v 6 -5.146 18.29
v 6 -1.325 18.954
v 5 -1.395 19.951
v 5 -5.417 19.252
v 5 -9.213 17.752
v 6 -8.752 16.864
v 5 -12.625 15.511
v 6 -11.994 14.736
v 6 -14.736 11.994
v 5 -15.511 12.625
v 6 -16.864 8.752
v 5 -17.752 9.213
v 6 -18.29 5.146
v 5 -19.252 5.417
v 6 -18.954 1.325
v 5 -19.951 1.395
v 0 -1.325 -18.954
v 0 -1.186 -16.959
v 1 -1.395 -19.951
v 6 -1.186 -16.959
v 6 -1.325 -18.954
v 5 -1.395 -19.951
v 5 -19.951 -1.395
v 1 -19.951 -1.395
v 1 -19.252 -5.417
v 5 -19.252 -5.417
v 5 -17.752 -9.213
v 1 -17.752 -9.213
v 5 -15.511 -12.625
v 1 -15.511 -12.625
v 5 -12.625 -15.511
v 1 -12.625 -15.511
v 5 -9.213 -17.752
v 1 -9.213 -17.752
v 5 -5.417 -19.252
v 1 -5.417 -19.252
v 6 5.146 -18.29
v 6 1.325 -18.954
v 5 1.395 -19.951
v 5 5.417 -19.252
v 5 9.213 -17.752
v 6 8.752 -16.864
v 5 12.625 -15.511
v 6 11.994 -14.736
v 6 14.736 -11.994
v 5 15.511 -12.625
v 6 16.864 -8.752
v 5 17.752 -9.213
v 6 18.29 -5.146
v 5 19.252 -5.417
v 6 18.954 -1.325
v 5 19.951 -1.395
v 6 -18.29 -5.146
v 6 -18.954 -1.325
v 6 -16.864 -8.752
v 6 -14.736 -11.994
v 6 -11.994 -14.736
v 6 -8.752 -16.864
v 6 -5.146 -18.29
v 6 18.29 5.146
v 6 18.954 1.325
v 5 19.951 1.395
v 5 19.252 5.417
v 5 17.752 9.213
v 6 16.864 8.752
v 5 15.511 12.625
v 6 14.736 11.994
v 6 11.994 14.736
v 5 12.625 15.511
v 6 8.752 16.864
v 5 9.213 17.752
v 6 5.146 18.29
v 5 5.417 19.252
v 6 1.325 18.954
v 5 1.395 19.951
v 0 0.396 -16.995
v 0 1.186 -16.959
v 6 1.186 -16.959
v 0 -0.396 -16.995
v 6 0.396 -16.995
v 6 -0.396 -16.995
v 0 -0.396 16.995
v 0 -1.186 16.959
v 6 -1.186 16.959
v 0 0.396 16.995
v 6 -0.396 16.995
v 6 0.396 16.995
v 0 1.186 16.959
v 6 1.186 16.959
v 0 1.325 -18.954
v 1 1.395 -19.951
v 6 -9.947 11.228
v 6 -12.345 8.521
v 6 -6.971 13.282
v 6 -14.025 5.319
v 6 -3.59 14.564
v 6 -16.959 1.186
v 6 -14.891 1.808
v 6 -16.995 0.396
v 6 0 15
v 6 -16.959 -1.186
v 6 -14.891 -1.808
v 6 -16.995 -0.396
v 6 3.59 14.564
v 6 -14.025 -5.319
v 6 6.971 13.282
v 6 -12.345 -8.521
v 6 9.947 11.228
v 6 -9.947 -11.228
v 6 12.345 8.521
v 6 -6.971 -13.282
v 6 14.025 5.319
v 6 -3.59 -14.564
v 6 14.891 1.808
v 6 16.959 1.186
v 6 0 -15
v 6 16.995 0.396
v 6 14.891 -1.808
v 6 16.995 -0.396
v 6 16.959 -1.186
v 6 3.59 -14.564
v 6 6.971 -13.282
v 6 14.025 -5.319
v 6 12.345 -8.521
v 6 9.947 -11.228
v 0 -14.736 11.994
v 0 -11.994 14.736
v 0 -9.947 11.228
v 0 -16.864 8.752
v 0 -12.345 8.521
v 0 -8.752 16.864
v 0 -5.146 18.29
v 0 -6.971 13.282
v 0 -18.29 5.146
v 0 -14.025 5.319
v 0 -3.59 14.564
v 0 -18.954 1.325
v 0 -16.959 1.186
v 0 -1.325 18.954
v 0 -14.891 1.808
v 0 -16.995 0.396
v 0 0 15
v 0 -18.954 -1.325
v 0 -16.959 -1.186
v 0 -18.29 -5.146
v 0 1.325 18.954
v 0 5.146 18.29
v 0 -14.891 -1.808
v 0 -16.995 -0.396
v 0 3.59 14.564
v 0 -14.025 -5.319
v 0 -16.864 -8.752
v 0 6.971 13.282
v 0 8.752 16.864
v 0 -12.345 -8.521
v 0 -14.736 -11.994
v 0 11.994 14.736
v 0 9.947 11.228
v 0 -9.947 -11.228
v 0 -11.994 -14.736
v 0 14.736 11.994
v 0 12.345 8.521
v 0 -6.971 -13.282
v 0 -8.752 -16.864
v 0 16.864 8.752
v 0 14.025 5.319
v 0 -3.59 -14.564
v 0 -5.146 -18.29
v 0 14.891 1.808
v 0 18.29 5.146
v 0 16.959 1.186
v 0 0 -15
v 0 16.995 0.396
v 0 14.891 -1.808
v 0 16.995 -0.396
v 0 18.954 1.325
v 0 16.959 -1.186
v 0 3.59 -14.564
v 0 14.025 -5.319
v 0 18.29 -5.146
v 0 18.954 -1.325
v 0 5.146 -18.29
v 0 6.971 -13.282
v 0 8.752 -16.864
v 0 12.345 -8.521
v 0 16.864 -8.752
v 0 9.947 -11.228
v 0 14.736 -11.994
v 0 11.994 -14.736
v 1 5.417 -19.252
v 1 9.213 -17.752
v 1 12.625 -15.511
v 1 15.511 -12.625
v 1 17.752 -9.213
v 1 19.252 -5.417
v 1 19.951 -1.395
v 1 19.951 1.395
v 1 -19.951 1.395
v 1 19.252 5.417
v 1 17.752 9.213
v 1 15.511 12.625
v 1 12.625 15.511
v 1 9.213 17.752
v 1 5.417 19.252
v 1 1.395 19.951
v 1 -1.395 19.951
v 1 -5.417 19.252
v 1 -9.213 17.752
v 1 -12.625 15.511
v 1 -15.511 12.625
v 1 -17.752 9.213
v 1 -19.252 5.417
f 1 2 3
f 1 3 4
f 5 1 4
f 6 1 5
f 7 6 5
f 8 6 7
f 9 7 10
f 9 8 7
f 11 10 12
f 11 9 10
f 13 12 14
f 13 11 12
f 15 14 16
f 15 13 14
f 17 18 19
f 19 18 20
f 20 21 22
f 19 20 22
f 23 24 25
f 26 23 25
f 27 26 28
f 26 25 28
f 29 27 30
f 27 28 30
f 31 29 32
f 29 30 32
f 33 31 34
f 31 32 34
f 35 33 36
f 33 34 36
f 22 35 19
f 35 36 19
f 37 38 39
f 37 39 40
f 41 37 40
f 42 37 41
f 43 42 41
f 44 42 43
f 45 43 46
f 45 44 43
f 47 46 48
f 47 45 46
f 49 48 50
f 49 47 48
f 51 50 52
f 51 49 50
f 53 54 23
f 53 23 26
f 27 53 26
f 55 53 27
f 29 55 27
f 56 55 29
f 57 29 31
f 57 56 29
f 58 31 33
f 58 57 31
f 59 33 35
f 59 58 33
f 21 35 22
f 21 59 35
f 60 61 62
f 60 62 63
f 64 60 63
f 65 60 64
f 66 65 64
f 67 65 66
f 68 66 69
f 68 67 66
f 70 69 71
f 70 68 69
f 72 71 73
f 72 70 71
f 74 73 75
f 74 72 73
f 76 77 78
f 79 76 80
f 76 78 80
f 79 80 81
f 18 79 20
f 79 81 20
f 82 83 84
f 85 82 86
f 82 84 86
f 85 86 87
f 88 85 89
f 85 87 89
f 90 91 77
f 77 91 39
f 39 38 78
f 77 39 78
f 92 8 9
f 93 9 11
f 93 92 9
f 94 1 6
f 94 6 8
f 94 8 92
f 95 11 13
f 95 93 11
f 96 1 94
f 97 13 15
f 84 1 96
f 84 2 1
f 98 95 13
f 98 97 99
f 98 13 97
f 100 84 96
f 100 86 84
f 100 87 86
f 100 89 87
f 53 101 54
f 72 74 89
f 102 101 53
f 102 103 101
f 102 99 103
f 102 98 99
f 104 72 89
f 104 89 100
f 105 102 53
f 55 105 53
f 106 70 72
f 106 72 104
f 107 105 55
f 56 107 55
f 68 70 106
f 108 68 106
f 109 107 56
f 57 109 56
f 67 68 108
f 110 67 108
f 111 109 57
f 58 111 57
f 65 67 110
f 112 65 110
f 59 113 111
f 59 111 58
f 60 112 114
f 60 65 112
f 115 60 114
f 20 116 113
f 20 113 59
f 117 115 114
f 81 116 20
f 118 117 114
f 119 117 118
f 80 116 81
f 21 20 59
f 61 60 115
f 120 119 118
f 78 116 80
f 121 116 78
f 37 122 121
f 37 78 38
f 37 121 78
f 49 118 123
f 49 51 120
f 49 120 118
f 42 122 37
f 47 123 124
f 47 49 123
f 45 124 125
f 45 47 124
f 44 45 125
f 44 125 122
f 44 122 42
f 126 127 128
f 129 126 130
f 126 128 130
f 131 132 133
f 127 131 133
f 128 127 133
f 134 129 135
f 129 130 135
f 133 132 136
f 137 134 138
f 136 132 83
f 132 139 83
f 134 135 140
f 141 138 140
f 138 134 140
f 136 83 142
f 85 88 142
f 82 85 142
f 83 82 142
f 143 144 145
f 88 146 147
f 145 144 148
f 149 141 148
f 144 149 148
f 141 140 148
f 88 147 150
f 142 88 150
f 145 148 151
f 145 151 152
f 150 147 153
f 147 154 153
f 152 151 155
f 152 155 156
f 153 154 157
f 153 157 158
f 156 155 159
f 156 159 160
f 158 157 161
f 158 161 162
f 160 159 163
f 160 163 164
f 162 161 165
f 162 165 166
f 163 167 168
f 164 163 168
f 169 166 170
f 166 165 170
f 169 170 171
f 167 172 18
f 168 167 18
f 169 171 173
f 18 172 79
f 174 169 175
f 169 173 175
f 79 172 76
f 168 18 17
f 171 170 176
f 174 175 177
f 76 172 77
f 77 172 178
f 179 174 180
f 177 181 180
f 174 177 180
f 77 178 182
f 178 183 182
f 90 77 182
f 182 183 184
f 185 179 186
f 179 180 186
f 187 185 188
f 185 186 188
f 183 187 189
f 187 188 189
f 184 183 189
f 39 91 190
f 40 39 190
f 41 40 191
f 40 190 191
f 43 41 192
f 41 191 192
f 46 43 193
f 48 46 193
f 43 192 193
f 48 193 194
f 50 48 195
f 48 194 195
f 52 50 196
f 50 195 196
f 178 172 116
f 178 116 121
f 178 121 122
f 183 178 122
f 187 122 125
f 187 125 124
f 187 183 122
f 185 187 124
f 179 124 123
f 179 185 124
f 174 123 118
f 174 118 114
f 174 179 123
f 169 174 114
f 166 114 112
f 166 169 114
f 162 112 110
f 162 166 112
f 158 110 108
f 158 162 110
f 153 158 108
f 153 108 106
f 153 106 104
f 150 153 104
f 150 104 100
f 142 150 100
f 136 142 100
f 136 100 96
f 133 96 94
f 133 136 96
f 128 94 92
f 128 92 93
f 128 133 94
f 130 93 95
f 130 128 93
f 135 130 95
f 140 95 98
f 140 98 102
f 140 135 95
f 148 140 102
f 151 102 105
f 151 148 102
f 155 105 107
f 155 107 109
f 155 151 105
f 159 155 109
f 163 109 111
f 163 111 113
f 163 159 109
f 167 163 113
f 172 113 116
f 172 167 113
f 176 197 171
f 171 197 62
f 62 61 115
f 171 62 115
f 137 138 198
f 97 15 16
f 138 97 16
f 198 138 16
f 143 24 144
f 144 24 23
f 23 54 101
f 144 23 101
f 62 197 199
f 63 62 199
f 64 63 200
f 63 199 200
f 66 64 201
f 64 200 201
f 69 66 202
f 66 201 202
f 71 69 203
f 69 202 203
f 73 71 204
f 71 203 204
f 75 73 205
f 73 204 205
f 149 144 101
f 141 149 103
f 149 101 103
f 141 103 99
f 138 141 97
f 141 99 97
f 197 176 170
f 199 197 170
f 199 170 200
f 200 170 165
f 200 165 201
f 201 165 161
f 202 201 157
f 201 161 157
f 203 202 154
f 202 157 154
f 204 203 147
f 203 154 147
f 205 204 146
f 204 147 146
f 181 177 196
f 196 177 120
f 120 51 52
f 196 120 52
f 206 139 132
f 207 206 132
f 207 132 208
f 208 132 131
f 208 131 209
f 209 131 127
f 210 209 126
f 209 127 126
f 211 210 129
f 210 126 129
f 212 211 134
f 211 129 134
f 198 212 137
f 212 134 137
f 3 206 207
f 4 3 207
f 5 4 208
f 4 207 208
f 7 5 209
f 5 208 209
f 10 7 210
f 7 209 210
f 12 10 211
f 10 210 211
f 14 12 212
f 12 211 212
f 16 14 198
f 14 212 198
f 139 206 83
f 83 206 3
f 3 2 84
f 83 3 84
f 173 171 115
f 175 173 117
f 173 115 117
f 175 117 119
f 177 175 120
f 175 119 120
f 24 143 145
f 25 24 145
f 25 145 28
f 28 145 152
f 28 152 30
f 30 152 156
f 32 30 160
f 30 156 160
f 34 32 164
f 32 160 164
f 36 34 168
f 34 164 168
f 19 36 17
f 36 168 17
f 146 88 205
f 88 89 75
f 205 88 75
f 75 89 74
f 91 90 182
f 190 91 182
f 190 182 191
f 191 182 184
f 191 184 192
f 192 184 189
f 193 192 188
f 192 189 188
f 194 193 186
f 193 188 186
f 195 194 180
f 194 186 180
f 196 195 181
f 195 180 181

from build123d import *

# Parameters (mm, degrees)
SKETCH_1_R               = 20
SKETCH_1_R_2             = 15
EXTRUDE_1_DEPTH          = 6
CHAMFER_1_SIZE           = 1
CUT_EXTRUDE_1_DEPTH      = 10
PATTERN_CIRCULAR_1_COUNT = 4


with BuildPart() as part:
    # 草图1 → 凸台-拉伸1 (new body)
    with BuildSketch(Plane(origin=(0, 0, 0), x_dir=(0, 0, -1), z_dir=(1, 0, 0))):
        Circle(SKETCH_1_R)
        Circle(SKETCH_1_R_2, mode=Mode.SUBTRACT)
    extrude(amount=EXTRUDE_1_DEPTH)

    # 倒角1
    chamfer_1_edges = [part.edges().sort_by_distance(p)[0] for p in [
        (6, 0, 20),
        (0, 0, 20),
    ]]
    chamfer(chamfer_1_edges, length=CHAMFER_1_SIZE)

    # 草图2 → 切除-拉伸1 (cut)
    with BuildSketch(Plane(origin=(6, 0, 0), x_dir=(0, 0, -1), z_dir=(1, 0, 0))):
        with BuildLine():
            Line((16.958588854, -1.185860054), (20.747478718, -1.450805043))
            ThreePointArc((20.747478718, -1.450805043), (20.798141947, 0), (20.747478718, 1.450805043))
            Line((20.747478718, 1.450805043), (16.958588854, 1.185860054))
            ThreePointArc((16.958588854, 1.185860054), (17, 0), (16.958588854, -1.185860054))
        make_face()
    cut_extrude_1 = extrude(amount=-CUT_EXTRUDE_1_DEPTH, mode=Mode.SUBTRACT)

    # 阵列(圆周)1: 切除-拉伸1 ×4 about axis
    pattern_circular_1_axis = Axis((6, 0, 0), (1, 0, 0))
    for i in range(1, PATTERN_CIRCULAR_1_COUNT):
        add(cut_extrude_1.rotate(pattern_circular_1_axis, i * 360 / PATTERN_CIRCULAR_1_COUNT), mode=Mode.SUBTRACT)


solid = part.part
